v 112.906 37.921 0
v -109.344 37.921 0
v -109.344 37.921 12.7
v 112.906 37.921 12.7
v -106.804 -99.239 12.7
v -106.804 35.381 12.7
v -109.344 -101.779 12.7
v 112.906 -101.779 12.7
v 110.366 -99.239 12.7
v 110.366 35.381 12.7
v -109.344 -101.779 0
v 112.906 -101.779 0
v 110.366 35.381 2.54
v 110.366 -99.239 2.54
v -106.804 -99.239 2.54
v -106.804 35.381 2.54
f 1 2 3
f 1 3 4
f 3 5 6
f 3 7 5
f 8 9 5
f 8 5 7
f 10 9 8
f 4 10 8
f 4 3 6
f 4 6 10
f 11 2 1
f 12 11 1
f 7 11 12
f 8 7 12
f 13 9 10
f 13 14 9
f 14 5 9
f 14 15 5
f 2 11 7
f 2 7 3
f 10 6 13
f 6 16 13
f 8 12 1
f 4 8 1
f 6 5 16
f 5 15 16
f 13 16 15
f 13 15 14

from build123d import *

# Parameters (mm, degrees)
F0_W     = 222.25
F0_H     = 139.7
F1_DEPTH = 12.7
F2_DEPTH = 12.7
F3_T     = -2.54


with BuildPart() as f1:
    # F0 (on Top) → F1 (new body)
    with BuildSketch(Plane.XY):
        with Locations((1.78089, -31.92896)):
            Rectangle(F0_W, F0_H)
    extrude(amount=F1_DEPTH)

    # F0 (on Top) → F2 (join)
    with BuildSketch(Plane.XY):
        with Locations((1.78089, -31.92896)):
            Rectangle(F0_W, F0_H)
    extrude(amount=F2_DEPTH)

    # F3
    f3_openings = [f1.faces().sort_by_distance(p)[0] for p in [
        (1.78089, -31.92896, 12.7),
    ]]
    offset(amount=F3_T, openings=f3_openings)


solid = f1.part
